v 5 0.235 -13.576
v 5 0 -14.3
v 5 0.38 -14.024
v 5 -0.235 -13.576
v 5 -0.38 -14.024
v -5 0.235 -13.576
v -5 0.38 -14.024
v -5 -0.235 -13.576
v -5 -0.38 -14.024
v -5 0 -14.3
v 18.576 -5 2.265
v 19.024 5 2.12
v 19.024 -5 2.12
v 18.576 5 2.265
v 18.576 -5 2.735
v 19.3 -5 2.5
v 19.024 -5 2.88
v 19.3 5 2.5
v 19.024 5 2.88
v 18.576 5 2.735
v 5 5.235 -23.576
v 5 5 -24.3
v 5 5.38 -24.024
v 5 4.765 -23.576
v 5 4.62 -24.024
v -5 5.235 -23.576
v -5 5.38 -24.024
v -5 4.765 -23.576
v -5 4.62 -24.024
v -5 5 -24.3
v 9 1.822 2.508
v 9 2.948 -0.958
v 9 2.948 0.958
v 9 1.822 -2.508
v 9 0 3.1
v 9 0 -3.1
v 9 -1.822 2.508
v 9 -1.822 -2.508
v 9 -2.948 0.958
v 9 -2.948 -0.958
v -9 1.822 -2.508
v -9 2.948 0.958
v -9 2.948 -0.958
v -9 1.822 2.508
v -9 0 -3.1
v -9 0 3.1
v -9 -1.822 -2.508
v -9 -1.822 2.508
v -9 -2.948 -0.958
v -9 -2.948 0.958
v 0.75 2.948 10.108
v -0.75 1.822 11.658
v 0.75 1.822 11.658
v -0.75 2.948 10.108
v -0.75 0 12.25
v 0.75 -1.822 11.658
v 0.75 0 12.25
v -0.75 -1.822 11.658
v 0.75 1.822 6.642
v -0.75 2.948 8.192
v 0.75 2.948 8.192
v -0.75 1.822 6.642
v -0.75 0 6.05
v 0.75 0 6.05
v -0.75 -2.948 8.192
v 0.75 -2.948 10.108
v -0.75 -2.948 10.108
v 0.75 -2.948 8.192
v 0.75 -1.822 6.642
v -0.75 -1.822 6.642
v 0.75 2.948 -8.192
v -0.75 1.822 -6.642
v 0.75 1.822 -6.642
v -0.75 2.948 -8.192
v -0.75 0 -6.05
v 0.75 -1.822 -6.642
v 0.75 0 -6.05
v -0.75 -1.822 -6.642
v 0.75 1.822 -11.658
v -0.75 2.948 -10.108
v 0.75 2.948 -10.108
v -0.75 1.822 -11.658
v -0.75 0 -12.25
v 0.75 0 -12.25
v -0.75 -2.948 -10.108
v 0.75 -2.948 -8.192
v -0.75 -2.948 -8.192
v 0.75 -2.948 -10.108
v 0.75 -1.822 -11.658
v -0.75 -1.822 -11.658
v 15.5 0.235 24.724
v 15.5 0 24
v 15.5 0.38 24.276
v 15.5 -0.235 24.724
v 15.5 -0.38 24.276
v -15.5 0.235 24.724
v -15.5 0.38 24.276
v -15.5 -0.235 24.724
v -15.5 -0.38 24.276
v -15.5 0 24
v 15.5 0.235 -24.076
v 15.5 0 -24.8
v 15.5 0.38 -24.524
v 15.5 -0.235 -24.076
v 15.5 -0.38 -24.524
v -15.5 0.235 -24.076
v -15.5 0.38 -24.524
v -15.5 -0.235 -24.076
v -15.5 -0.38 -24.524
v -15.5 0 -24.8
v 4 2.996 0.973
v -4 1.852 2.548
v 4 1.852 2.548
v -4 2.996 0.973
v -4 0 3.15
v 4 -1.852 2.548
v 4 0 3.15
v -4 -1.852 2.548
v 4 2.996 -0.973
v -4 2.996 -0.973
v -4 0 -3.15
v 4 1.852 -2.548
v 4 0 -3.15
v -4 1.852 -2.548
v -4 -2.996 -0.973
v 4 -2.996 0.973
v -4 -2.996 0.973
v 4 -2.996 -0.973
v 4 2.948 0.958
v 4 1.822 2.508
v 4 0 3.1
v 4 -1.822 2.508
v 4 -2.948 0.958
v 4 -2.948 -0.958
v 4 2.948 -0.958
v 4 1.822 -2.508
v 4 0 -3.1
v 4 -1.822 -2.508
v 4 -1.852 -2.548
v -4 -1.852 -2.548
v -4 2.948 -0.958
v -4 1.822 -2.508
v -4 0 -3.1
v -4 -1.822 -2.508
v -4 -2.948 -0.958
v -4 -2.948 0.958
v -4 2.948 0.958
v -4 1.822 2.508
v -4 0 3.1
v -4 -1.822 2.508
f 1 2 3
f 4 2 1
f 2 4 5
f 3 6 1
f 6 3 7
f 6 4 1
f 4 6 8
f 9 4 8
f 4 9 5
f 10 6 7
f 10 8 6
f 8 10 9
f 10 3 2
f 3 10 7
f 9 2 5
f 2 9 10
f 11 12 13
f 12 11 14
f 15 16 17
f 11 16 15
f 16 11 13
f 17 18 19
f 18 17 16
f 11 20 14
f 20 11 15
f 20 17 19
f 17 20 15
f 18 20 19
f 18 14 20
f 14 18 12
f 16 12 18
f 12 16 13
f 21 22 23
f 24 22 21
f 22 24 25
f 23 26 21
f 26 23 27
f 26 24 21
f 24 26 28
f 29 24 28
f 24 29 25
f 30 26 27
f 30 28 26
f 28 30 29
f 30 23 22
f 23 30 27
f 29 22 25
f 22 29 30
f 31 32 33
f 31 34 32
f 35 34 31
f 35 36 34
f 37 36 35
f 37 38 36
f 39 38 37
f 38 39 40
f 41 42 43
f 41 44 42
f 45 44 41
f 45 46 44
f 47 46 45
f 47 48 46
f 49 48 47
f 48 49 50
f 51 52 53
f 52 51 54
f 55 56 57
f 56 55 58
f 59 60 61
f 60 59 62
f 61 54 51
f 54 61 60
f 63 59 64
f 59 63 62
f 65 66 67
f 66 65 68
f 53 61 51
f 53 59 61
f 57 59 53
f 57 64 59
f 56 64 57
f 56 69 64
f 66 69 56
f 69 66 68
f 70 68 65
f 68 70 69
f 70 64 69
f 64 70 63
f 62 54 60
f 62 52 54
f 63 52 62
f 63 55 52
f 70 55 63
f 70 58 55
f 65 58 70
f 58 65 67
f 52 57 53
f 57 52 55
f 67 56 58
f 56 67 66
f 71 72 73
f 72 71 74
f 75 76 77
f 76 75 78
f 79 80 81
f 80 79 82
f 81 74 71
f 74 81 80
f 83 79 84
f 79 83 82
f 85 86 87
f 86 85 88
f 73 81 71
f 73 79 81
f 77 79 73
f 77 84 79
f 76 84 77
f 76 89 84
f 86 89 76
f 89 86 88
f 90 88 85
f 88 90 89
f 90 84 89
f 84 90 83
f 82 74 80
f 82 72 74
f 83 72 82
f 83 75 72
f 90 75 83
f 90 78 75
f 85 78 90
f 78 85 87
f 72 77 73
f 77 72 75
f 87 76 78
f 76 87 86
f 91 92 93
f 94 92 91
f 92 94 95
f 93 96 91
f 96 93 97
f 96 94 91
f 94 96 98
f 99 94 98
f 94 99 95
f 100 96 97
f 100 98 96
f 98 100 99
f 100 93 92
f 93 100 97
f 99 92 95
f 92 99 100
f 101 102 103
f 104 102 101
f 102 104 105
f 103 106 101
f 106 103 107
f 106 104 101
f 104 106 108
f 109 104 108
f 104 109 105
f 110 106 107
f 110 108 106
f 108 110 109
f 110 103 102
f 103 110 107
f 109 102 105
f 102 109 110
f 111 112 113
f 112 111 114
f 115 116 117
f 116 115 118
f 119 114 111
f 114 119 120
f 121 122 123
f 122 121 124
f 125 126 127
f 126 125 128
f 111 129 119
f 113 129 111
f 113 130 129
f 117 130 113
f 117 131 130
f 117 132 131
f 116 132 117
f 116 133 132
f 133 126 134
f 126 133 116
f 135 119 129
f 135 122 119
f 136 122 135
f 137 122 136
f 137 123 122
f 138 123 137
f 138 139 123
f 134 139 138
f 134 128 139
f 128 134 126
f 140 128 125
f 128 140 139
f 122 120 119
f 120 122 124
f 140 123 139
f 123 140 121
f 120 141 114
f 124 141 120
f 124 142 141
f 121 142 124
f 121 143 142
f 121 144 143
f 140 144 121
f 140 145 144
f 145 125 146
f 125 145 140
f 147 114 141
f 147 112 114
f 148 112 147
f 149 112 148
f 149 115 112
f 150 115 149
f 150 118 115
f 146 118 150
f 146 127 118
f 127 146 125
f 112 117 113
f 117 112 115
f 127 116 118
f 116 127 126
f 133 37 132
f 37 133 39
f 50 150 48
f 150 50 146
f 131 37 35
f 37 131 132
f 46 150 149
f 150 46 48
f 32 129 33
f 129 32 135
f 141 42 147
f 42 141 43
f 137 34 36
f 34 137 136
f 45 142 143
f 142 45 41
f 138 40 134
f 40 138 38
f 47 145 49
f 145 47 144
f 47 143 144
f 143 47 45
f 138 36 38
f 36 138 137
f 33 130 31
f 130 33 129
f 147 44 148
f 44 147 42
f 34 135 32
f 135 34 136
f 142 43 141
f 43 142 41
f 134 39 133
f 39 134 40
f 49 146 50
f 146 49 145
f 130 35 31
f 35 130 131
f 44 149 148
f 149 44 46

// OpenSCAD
// Parameters
body_length = 18; //[9:36:0.5]
body_diameter = 6; //[3:12:0.1]
lead_diameter = 0.8; //[0.4:1.6:0.05]
lead_length_each = 30; //[15:60:1]
cap_length = 1.5; //[0.75:3:0.1]
cap_diameter = 6.2; //[3.1:12.4:0.1]
lead_overlap = 1; //[0.5:2:0.1]
cap_overlap = 0.6; //[0.3:1.5:0.1]
marking_band_length = 8; //[4:16:0.5]
marking_band_thickness = 0.15; //[0.05:0.4:0.01]
gloss_shell_thickness = 0.1; //[0.05:0.3:0.01]
bend_leg_length = 10; //[5:25:0.5]
bend_offset = 5; //[2:15:0.5]

// Resistor Body
module resistor_body() {
  color([0.85, 0.85, 0.8]) // Off-white for ceramic/enamel
  rotate([0, 90, 0])
  translate([0, 0, 0])
  cylinder(r=body_diameter/2, h=body_length, center=true);
}

// End Caps
module end_cap_left() {
  color([0.75, 0.75, 0.77]) // Silver for metal caps
  rotate([0, 90, 0])
  translate([-(body_length/2 + cap_length/2 - cap_overlap), 0, 0])
  cylinder(r=cap_diameter/2, h=cap_length, center=true);
}

module end_cap_right() {
  color([0.75, 0.75, 0.77]) // Silver for metal caps
  rotate([0, 90, 0])
  translate([(body_length/2 + cap_length/2 - cap_overlap), 0, 0])
  cylinder(r=cap_diameter/2, h=cap_length, center=true);
}

// Leads
module lead_left() {
  color([0.4, 0.4, 0.43]) // DimGray for leads
  rotate([0, 90, 0])
  translate([-(body_length/2 + cap_length - cap_overlap + (lead_length_each + lead_overlap)/2 - lead_overlap), 0, 0])
  cylinder(r=lead_diameter/2, h=lead_length_each + lead_overlap, center=true);
}

module lead_right() {
  color([0.4, 0.4, 0.43]) // DimGray for leads
  rotate([0, 90, 0])
  translate([(body_length/2 + cap_length - cap_overlap + (lead_length_each + lead_overlap)/2 - lead_overlap), 0, 0])
  cylinder(r=lead_diameter/2, h=lead_length_each + lead_overlap, center=true);
}

// Marking Band
module body_marking_text() {
  color([0.7, 0.7, 0.7]) // Slightly darker for marking
  rotate([0, 90, 0])
  translate([0, 0, 0])
  cylinder(r=body_diameter/2 + marking_band_thickness, h=marking_band_length, center=true);
}

// Surface Gloss Detail
module surface_gloss_detail() {
  color([0.9, 0.9, 0.9, 0.3]) // Semi-transparent gloss
  rotate([0, 90, 0])
  translate([0, 0, 0])
  cylinder(r=body_diameter/2 + gloss_shell_thickness, h=body_length, center=true);
}

// Lead Bend Form
module lead_bend_form() {
  union() {
    // Leg 1
    rotate([0, 90, 0])
    translate([(body_length/2 + cap_length - cap_overlap + bend_leg_length/2 - lead_overlap), 0, 0])
    cylinder(r=lead_diameter/2, h=bend_leg_length, center=true);

    // Leg 2
    rotate([90, 0, 0])
    translate([(body_length/2 + cap_length - cap_overlap + bend_leg_length - lead_overlap), bend_offset/2, 0])
    cylinder(r=lead_diameter/2, h=bend_leg_length, center=true);

    // Leg 3
    rotate([0, 90, 0])
    translate([(body_length/2 + cap_length - cap_overlap + bend_leg_length + bend_leg_length/2 - lead_overlap), bend_offset, 0])
    cylinder(r=lead_diameter/2, h=bend_leg_length, center=true);
  }
}

// Complete Resistor
module resistor_complete() {
  union() {
    resistor_body();
    end_cap_left();
    end_cap_right();
    lead_left();
    lead_right();
    body_marking_text();
    surface_gloss_detail();
    lead_bend_form();
  }
}

// Final Output
resistor_complete();
